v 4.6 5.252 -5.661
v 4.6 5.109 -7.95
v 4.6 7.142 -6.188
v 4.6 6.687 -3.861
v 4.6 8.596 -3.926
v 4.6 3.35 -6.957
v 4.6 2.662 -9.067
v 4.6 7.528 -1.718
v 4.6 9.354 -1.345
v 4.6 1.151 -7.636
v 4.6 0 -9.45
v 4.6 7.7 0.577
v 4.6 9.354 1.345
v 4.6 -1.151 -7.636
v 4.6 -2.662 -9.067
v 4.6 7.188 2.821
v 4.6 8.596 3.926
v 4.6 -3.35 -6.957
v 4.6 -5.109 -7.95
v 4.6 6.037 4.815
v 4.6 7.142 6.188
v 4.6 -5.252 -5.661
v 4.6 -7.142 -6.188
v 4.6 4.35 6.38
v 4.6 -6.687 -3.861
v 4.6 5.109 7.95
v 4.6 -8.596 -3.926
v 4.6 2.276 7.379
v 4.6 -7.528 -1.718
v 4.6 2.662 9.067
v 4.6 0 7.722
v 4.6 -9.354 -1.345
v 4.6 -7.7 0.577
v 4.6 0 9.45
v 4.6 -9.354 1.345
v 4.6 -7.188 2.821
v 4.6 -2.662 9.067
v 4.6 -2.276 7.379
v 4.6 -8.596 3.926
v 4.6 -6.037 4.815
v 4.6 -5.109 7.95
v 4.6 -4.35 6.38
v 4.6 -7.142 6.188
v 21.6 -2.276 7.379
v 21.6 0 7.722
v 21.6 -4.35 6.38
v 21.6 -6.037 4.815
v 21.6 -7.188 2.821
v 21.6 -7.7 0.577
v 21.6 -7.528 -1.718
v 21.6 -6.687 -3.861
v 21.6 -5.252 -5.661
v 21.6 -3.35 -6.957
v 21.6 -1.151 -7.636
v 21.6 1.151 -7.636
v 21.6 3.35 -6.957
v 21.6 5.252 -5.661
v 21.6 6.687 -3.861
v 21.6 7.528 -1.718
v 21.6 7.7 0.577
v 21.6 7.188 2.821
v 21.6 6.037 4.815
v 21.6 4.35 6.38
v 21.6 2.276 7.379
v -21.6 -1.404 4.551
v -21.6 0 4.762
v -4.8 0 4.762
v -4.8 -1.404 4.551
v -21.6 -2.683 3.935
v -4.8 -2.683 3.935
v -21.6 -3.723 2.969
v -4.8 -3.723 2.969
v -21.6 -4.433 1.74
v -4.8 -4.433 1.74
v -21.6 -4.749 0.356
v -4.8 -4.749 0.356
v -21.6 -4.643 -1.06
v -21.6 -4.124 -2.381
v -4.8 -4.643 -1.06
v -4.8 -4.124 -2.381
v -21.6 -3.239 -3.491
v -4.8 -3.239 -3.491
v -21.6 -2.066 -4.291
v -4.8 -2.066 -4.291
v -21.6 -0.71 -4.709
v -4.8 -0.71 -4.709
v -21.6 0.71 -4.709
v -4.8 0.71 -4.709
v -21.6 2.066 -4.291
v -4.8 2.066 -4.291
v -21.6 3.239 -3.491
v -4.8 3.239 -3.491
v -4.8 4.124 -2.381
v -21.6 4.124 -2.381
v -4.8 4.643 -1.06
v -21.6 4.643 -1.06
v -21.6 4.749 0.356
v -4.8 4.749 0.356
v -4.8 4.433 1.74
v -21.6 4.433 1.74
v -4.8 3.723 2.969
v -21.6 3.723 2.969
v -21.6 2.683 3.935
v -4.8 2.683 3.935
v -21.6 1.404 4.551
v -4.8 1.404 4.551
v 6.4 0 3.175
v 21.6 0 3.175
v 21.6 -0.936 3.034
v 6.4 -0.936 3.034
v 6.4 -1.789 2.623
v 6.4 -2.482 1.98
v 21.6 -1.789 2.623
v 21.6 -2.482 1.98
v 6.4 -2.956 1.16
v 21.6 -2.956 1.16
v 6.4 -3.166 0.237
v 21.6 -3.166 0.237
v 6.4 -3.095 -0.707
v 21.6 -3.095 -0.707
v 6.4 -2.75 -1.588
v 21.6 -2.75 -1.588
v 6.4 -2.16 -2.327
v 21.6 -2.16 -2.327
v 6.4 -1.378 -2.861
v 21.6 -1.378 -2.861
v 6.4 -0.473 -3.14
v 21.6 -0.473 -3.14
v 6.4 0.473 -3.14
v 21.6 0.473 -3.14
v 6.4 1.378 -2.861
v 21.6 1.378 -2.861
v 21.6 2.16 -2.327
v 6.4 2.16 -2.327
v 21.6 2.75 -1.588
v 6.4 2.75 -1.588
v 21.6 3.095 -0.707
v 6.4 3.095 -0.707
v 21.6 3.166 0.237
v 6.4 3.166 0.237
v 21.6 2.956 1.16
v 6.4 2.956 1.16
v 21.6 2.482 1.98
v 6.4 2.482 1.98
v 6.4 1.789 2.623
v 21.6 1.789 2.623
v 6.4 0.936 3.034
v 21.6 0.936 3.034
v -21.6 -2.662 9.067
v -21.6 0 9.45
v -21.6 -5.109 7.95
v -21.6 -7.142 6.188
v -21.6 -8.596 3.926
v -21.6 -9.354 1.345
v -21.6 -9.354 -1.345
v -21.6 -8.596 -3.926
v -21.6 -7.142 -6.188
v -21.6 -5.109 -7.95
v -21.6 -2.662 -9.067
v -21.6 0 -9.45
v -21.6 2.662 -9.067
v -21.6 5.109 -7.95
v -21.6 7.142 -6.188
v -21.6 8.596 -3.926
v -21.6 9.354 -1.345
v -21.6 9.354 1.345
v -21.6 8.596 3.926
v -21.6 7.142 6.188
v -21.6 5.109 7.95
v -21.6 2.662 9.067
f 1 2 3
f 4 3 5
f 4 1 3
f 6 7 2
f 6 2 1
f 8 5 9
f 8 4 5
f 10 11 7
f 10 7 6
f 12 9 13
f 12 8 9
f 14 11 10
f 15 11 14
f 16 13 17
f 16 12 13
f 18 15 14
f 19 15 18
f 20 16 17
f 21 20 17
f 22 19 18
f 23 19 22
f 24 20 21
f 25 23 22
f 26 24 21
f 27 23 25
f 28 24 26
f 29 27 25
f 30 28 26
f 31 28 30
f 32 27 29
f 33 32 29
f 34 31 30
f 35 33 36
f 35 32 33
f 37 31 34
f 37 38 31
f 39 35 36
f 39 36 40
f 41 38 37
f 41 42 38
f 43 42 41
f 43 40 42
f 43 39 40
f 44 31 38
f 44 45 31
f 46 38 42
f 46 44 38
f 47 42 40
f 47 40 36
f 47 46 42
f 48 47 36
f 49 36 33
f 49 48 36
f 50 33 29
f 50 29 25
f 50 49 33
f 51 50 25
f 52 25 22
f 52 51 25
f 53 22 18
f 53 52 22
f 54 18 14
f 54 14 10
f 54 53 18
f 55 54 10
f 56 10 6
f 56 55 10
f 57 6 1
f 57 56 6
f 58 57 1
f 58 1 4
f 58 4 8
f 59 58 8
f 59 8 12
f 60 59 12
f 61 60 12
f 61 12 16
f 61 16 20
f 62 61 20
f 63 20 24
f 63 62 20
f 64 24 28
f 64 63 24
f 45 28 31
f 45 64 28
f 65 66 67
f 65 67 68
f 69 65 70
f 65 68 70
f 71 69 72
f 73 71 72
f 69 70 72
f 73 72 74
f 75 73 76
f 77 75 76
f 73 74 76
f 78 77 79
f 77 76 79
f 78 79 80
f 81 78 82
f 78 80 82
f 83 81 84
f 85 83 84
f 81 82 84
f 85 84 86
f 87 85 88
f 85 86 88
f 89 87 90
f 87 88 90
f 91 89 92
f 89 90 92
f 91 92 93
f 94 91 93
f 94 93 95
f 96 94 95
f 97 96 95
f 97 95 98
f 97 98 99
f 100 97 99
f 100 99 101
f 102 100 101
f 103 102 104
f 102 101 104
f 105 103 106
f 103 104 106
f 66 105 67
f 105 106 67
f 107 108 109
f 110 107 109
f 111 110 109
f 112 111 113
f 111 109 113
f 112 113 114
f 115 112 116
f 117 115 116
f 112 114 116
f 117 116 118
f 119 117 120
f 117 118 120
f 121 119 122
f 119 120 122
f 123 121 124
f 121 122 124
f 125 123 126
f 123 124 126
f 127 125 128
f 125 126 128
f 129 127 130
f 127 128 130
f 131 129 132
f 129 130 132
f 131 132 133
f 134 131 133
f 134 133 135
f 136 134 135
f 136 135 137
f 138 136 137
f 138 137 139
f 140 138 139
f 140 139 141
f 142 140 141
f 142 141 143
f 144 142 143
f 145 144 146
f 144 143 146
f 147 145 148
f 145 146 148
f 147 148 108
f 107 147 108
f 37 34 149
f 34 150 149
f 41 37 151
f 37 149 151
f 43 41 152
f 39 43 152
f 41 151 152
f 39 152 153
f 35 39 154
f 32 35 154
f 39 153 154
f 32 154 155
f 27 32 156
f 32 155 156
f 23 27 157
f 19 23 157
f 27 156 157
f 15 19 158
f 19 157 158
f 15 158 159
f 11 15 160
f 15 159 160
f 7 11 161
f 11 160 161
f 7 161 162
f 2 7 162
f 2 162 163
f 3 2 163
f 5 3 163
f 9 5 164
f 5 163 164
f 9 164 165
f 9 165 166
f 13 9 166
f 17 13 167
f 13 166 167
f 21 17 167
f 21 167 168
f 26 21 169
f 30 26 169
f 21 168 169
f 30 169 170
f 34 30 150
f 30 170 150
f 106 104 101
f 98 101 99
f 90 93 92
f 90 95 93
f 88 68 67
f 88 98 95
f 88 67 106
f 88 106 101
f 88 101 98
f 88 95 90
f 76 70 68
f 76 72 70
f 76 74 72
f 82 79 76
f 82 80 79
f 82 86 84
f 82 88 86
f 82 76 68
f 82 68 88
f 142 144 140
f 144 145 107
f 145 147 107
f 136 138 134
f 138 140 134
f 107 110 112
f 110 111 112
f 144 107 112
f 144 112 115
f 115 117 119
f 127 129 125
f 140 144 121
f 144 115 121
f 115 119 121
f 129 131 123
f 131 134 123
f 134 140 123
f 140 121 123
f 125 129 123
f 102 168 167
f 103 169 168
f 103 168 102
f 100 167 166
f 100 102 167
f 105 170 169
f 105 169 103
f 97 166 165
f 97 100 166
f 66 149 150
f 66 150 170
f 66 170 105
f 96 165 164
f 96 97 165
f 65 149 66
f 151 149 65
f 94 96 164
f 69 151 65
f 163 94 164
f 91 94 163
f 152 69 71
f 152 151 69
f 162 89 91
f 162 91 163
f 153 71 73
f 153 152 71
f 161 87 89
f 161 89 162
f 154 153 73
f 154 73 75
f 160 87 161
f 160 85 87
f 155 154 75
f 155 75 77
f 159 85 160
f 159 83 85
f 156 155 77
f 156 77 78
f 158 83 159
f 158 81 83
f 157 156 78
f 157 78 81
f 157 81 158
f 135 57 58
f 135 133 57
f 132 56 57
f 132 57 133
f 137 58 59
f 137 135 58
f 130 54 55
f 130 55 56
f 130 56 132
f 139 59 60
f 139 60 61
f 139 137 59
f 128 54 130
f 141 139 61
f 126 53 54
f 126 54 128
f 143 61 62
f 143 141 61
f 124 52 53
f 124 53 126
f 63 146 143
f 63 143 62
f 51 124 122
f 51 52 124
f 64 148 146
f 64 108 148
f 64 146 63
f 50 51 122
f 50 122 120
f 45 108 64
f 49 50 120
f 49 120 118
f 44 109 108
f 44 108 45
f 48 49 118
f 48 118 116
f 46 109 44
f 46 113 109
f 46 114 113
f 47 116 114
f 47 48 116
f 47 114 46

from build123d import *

# Parameters (mm, degrees)
SOCKET_1_SKETCH_W = 17.8
SOCKET_1_SKETCH_H = 4.7625
SOCKET_2_SKETCH_W = 16.2
SOCKET_2_SKETCH_H = 3.175


with BuildPart() as part:
    # Reducer_T6_T4 Sketch → Reducer_T6_T4 (revolve)
    with BuildSketch(Plane.XY):
        Polygon((-21.6, 0), (-21.6, 9.45), (0.4, 9.45), (4.6, 9.45), (4.6, 7.722), (21.6, 7.722), (21.6, 0), align=None)
    revolve(axis=Axis((-1000, 0, 0), (1, 0, 0)))

    # Socket 1 Sketch → Socket 1 (revolve, cut)
    with BuildSketch(Plane.XY):
        with Locations((-13.7, 2.38125)):
            Rectangle(SOCKET_1_SKETCH_W, SOCKET_1_SKETCH_H)
    revolve(axis=Axis((-1000, 0, 0), (1, 0, 0)), mode=Mode.SUBTRACT)

    # Socket 2 Sketch → Socket 2 (revolve, cut)
    with BuildSketch(Plane.XY):
        with Locations((14.5, 1.5875)):
            Rectangle(SOCKET_2_SKETCH_W, SOCKET_2_SKETCH_H)
    revolve(axis=Axis((-1000, 0, 0), (1, 0, 0)), mode=Mode.SUBTRACT)


solid = part.part
